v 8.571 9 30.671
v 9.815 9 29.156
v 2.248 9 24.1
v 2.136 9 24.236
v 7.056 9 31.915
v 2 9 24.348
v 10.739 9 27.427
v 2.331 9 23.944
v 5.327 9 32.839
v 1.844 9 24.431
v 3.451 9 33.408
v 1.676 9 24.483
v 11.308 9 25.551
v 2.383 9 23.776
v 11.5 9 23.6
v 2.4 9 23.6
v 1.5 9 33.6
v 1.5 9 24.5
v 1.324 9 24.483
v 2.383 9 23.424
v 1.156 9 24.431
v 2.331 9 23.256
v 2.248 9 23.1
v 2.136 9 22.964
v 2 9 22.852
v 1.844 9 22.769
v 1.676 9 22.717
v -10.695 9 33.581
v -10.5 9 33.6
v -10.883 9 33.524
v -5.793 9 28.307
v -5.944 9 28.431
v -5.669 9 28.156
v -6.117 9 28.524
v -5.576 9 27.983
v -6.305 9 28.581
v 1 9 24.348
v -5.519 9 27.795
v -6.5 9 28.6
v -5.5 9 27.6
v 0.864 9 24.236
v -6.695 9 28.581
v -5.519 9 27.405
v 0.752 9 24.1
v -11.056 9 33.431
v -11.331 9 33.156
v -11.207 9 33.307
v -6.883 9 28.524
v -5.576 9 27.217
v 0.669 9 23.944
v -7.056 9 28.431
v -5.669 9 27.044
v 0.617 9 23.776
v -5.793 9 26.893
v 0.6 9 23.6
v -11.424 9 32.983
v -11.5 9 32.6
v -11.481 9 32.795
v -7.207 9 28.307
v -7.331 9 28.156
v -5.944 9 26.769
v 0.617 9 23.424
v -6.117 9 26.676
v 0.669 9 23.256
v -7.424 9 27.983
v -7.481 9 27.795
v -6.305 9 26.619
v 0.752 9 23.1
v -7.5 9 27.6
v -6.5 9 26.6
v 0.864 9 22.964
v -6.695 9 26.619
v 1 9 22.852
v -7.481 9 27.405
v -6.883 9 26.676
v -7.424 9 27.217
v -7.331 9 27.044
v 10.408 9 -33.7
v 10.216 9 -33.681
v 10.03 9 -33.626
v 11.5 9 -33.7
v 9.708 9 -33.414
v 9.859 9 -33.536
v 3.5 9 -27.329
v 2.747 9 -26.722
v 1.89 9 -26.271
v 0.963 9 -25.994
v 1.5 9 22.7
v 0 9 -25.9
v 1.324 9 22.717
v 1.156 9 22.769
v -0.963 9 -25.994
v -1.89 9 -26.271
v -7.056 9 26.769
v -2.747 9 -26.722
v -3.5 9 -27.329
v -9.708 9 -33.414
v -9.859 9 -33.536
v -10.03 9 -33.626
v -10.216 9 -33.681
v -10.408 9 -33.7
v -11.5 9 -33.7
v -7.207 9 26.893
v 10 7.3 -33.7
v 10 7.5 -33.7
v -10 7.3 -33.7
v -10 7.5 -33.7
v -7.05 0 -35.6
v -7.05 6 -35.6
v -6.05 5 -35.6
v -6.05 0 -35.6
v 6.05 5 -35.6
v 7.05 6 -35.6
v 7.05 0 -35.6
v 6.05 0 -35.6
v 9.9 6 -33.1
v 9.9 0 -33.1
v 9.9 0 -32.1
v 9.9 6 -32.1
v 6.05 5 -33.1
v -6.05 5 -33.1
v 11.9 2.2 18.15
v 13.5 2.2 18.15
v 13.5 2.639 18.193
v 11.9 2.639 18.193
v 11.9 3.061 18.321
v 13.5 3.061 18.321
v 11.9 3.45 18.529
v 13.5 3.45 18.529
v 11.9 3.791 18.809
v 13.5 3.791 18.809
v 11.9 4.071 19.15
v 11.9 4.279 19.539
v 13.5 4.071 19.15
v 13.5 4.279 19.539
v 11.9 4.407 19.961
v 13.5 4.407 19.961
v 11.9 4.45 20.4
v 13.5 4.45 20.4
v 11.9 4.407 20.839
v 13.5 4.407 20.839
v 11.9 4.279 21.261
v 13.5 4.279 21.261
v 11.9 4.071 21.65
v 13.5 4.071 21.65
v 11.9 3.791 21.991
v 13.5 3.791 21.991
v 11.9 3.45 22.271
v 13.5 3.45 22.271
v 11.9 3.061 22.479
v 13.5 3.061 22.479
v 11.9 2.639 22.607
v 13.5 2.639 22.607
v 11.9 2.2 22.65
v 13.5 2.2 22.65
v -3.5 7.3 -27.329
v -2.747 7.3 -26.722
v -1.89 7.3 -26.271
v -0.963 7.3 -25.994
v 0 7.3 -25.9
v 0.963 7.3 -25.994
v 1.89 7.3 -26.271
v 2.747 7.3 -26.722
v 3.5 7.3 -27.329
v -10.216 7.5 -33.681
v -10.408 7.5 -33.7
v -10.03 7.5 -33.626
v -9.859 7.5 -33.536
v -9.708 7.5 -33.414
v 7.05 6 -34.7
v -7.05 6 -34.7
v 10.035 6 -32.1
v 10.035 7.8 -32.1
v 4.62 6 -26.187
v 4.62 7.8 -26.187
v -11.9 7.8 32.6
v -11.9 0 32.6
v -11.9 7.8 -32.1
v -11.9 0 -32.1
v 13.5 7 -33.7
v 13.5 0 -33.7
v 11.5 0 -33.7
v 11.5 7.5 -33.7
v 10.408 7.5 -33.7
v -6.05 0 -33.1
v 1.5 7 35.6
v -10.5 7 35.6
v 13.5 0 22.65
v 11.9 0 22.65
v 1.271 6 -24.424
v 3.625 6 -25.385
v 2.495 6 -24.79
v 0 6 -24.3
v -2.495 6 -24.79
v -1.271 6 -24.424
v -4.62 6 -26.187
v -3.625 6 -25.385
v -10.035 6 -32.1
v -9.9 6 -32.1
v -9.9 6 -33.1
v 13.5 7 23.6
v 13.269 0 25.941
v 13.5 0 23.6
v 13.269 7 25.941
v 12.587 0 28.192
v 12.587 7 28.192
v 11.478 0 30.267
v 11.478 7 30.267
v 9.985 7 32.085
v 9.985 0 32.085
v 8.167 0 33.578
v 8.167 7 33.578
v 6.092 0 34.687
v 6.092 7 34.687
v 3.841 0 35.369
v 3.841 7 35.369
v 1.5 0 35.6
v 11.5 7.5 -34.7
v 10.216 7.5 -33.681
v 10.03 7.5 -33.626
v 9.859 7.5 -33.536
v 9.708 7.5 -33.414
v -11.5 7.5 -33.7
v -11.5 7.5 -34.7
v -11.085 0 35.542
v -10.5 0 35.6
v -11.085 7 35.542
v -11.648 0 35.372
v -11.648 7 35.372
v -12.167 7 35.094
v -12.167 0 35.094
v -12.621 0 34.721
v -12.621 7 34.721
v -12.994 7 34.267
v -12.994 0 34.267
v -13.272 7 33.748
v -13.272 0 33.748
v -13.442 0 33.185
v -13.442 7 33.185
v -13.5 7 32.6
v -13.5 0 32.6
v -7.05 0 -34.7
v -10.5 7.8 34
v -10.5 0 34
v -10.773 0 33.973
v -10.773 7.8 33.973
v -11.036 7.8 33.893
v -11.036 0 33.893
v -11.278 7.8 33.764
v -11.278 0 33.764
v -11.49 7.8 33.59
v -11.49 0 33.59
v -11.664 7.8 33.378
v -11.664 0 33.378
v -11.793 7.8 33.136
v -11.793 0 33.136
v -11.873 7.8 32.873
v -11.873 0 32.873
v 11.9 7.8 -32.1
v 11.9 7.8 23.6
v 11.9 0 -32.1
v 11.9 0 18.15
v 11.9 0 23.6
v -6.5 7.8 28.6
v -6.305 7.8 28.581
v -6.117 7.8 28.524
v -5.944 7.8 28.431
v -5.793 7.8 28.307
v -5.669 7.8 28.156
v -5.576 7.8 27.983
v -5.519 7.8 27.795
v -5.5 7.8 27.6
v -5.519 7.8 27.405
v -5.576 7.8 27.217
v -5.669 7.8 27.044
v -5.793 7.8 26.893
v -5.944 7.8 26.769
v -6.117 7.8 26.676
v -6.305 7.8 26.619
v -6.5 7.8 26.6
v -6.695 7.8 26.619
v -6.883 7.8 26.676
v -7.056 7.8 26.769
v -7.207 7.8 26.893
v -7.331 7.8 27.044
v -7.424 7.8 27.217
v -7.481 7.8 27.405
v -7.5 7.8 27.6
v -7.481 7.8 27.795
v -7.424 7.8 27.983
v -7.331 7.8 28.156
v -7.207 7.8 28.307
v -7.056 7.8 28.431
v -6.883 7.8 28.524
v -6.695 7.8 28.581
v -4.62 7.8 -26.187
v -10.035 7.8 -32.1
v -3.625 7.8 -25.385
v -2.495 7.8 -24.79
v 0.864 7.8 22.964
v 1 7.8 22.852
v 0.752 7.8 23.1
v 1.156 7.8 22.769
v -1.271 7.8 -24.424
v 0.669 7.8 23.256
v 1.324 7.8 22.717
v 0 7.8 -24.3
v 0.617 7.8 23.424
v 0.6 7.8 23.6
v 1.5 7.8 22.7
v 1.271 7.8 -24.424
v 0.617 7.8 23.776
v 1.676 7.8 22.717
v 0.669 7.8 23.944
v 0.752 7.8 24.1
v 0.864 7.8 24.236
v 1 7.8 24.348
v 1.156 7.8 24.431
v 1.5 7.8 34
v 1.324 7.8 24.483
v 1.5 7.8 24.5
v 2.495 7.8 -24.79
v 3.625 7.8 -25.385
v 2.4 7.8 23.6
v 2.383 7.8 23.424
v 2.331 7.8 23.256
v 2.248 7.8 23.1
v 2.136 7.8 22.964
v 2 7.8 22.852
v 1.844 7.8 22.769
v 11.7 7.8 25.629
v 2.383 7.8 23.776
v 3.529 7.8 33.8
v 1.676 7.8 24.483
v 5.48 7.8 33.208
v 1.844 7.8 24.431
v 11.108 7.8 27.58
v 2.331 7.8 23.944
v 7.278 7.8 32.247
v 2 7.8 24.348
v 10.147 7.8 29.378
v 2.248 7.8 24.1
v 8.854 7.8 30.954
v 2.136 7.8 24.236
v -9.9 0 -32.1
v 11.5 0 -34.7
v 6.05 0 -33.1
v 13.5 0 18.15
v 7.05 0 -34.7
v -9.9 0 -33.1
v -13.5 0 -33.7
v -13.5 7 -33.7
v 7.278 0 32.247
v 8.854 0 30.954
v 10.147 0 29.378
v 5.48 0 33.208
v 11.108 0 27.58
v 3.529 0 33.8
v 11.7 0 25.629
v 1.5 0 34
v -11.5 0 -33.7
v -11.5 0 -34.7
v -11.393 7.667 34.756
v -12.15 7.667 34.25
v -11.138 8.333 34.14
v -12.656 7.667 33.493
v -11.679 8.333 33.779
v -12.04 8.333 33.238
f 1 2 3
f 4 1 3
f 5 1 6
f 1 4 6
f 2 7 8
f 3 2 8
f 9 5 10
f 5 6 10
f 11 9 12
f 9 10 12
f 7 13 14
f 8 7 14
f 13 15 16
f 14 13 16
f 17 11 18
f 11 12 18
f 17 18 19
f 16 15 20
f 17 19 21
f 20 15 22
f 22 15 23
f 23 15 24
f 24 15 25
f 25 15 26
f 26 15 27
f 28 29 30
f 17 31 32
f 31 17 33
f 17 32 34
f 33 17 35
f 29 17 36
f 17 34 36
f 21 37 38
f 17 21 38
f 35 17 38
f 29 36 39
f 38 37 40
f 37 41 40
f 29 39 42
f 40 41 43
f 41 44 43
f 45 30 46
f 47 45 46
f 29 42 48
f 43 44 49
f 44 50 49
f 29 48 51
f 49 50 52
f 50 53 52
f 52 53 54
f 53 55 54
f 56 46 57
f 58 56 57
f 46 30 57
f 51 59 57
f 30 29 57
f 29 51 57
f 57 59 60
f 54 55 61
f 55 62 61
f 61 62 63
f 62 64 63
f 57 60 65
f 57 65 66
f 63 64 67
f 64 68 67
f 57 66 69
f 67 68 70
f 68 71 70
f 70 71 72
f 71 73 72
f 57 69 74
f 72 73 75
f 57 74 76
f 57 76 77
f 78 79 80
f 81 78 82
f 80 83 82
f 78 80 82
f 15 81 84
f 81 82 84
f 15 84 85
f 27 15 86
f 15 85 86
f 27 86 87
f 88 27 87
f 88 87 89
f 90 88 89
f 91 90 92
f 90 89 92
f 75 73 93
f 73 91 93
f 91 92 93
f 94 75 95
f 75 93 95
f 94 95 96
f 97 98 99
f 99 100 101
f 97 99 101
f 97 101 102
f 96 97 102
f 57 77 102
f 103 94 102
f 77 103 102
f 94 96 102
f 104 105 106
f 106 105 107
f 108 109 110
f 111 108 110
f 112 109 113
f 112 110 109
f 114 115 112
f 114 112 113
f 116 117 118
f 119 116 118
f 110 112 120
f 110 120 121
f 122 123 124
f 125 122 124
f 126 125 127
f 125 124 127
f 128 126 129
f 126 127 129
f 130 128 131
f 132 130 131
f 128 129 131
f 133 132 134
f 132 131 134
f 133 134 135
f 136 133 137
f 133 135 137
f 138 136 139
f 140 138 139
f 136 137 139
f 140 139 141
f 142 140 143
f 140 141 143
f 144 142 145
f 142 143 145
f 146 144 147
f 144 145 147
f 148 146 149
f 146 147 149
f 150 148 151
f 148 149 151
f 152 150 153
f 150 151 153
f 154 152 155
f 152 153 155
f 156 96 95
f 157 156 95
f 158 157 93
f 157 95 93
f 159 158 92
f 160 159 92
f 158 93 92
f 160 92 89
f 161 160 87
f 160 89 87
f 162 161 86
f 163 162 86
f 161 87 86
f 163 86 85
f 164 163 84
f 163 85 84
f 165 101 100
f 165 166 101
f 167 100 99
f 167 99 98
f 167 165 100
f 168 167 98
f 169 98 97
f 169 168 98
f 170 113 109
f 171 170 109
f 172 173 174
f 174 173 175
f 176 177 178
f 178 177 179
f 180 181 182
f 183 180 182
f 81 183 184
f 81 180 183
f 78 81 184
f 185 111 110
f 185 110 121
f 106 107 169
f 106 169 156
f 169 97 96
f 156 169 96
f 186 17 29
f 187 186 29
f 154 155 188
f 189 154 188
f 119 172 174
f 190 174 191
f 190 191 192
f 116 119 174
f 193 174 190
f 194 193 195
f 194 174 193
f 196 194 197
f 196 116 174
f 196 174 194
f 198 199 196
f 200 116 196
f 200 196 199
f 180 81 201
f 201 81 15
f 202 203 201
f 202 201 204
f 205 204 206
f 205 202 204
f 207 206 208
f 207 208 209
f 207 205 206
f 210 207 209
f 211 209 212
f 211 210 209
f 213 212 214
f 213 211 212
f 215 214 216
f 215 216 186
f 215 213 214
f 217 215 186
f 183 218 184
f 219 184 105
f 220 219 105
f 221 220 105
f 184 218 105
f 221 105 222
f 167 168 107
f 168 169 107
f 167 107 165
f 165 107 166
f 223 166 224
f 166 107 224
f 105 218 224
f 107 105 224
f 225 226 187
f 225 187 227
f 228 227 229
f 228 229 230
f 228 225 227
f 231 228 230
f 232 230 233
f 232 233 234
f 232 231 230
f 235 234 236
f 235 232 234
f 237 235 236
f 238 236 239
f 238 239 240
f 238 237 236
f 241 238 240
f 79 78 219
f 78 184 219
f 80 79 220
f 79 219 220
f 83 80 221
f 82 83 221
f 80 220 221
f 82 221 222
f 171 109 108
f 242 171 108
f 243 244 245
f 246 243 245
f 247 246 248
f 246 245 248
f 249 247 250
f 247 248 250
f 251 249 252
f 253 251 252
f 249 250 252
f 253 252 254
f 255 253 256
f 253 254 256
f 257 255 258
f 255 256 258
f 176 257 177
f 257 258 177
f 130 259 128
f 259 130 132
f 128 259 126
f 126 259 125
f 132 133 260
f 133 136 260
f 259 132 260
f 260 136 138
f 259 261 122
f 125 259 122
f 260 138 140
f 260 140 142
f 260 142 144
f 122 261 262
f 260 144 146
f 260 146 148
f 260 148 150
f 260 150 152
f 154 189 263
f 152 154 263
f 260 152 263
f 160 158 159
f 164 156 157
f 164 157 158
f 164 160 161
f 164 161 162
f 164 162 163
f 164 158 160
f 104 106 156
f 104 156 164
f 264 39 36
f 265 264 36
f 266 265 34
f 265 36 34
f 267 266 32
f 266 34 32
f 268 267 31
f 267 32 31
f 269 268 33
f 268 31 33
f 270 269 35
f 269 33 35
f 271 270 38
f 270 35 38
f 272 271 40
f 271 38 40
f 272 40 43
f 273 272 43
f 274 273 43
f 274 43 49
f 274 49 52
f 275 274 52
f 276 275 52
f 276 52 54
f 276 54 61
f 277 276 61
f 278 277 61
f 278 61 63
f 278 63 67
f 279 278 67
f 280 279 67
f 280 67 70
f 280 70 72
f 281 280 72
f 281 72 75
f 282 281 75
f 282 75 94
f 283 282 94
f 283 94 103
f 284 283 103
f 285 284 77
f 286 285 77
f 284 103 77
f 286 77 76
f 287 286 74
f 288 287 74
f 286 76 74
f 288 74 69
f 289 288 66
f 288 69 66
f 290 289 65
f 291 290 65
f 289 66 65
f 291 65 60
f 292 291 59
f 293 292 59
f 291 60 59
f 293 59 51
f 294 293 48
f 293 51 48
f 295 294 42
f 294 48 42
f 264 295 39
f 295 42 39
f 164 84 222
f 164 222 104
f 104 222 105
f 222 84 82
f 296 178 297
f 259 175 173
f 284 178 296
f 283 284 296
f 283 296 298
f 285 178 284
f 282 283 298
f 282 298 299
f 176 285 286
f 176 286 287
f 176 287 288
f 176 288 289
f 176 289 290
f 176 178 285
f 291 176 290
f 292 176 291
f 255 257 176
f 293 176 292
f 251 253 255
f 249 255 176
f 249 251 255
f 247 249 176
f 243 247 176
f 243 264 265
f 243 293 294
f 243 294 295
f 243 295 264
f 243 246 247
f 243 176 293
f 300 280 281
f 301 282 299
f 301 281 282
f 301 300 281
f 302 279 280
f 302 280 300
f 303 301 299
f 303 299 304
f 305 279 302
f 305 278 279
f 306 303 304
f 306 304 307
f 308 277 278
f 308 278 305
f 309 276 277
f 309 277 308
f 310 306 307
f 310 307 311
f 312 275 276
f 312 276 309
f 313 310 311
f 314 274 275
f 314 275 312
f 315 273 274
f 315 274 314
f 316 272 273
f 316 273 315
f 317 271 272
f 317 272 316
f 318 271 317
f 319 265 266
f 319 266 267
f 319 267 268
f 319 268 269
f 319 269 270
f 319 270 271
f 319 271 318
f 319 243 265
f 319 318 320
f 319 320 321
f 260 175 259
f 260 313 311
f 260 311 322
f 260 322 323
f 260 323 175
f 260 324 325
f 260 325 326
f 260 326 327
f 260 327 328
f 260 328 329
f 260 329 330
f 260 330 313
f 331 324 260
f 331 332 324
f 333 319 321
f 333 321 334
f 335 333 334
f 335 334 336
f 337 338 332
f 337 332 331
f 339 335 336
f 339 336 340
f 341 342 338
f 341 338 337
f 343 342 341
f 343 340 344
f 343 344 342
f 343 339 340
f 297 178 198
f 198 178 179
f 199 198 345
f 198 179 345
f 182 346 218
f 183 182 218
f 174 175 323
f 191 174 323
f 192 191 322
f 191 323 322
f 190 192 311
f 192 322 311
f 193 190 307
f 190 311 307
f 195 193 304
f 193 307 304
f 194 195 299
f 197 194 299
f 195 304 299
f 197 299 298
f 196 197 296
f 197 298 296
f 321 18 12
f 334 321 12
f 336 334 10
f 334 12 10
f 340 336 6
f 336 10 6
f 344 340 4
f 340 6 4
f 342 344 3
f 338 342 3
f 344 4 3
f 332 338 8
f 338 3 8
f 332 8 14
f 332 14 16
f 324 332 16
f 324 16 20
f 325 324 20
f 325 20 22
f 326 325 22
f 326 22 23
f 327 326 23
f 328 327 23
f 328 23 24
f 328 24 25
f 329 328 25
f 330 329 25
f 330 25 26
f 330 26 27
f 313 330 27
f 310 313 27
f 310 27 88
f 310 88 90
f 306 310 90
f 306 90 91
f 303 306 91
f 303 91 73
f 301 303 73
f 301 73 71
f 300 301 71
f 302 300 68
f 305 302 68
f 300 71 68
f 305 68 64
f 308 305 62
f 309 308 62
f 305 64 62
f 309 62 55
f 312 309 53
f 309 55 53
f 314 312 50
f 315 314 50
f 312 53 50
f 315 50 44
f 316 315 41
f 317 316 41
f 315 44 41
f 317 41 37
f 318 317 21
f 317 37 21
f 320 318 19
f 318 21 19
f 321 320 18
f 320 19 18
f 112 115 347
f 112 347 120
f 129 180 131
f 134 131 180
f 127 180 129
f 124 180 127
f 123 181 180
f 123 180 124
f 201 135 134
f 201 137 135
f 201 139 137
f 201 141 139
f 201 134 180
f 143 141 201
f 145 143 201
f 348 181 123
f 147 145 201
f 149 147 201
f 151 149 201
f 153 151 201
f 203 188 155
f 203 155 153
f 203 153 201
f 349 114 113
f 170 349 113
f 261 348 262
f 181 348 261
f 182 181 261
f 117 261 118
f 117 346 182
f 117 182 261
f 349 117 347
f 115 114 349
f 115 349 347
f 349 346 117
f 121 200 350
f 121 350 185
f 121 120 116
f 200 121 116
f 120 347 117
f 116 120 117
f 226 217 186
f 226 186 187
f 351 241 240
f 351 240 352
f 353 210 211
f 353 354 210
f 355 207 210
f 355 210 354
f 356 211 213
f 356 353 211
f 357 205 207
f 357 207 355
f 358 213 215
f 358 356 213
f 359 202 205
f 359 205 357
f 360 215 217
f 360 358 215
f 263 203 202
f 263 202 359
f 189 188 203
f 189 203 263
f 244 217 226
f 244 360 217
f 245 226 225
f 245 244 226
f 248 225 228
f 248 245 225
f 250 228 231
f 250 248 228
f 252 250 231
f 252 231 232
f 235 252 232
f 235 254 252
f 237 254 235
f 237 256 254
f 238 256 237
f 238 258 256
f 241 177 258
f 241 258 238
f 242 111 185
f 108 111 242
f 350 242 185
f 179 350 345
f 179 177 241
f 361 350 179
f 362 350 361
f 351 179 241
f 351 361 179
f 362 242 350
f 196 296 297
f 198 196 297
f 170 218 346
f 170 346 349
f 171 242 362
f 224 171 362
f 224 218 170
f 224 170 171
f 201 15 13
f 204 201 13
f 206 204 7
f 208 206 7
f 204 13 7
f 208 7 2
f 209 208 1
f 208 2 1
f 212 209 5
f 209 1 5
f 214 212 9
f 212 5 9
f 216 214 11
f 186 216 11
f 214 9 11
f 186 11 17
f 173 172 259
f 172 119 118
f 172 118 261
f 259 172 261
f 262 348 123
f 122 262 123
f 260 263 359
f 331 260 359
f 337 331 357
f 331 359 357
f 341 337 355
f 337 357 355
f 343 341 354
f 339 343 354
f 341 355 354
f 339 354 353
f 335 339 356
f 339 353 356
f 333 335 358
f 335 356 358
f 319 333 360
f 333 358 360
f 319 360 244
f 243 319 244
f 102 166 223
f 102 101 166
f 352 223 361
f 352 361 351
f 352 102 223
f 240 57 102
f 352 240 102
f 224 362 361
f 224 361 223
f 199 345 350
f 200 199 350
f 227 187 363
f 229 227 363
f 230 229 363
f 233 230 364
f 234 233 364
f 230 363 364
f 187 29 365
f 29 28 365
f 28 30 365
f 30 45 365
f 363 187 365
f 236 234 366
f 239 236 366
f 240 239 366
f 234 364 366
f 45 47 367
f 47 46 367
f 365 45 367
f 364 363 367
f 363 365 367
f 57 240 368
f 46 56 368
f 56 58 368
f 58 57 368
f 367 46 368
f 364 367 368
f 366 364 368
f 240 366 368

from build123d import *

# Parameters (mm, degrees)
EXTRUDE_1_DEPTH     = 9
SKETCH_2_W          = 12.1
SKETCH_2_H          = 5
CUT_EXTRUDE_1_DEPTH = 0.9
SKETCH_3_R          = 29.401854515
SKETCH_3_W          = 23
SKETCH_3_H          = 15
CUT_EXTRUDE_2_DEPTH = 1
CHAMFER_1_SIZE      = 2
CUT_EXTRUDE_4_DEPTH = 7.8
SKETCH_5_W          = 12.1
SKETCH_5_H          = 1.6
CUT_EXTRUDE_5_DEPTH = 5
SKETCH_6_R          = 1
SKETCH_6_R_2        = 0.9
CUT_EXTRUDE_6_DEPTH = 3
CUT_EXTRUDE_7_DEPTH = 3
EXTRUDE_2_DEPTH     = 3
CUT_EXTRUDE_9_DEPTH = 1.7
FILLET_1_R          = 1


with BuildPart() as part:
    # Эскиз1 → Бобышка-Вытянуть1 (new body)
    with BuildSketch(Plane(origin=(0, 0, 0), x_dir=(1, 0, 0), z_dir=(0, 1, 0))):
        with BuildLine():
            Line((-13.5, 35.6), (13.5, 35.6))
            Line((13.5, 35.6), (13.5, -23.6))
            ThreePointArc((13.5, -23.6), (9.985281374, -32.085281374), (1.5, -35.6))
            Line((1.5, -35.6), (-10.5, -35.6))
            ThreePointArc((-10.5, -35.6), (-12.621320344, -34.721320344), (-13.5, -32.6))
            Line((-13.5, -32.6), (-13.5, 35.6))
        make_face()
    extrude(amount=EXTRUDE_1_DEPTH)

    # Эскиз2 → Вырез-Вытянуть1 (cut)
    with BuildSketch(Plane(origin=(0, 0, -35.6), x_dir=(-1, 0, 0), z_dir=(0, 0, -1))):
        Polygon((7.05, 6), (7.05, 0), (13.5, 0), (13.5, 9), (-13.5, 9), (-13.5, 0), (-7.05, 0), (-7.05, 6), align=None)
        with Locations((0, 2.5)):
            Rectangle(SKETCH_2_W, SKETCH_2_H)
    extrude(amount=-CUT_EXTRUDE_1_DEPTH, mode=Mode.SUBTRACT)

    # Эскиз3 → Вырез-Вытянуть2 (cut)
    with BuildSketch(Plane(origin=(0, 0, -34.7), x_dir=(-1, 0, 0), z_dir=(0, 0, -1))):
        Circle(SKETCH_3_R)
        Rectangle(SKETCH_3_W, SKETCH_3_H, mode=Mode.SUBTRACT)
    extrude(amount=-CUT_EXTRUDE_2_DEPTH, mode=Mode.SUBTRACT)

    # Фаска1
    chamfer_1_edges = [part.edges().sort_by_distance(p)[0] for p in [
        (-4.5, 9, 35.6),
        (9.985281374, 9, 32.085281374),
        (13.5, 9, -5.05),
        (-13.5, 9, -0.55),
        (-12.621320344, 9, 34.721320344),
    ]]
    chamfer(chamfer_1_edges, length=CHAMFER_1_SIZE)

    # Эскиз4 → Вырез-Вытянуть4 (cut)
    with BuildSketch(Plane.XZ):
        with BuildLine():
            Line((9.9, -33.1), (9.9, -32.1))
            Line((9.9, -32.1), (11.9, -32.1))
            Line((11.9, -32.1), (11.9, 23.6))
            ThreePointArc((11.9, 23.6), (8.853910524, 30.953910524), (1.5, 34))
            Line((1.5, 34), (-10.5, 34))
            ThreePointArc((-10.5, 34), (-11.489949494, 33.589949494), (-11.9, 32.6))
            Line((-11.9, 32.6), (-11.9, -32.1))
            Line((-11.9, -32.1), (-9.9, -32.1))
            Line((-9.9, -32.1), (-9.9, -33.1))
            Line((-9.9, -33.1), (9.9, -33.1))
        make_face()
    extrude(amount=-CUT_EXTRUDE_4_DEPTH, mode=Mode.SUBTRACT)

    # Эскиз5 → Вырез-Вытянуть5 (cut)
    with BuildSketch(Plane.XZ):
        with Locations((0, -33.9)):
            Rectangle(SKETCH_5_W, SKETCH_5_H)
    extrude(amount=-CUT_EXTRUDE_5_DEPTH, mode=Mode.SUBTRACT)

    # Эскиз6 → Вырез-Вытянуть6 (cut)
    with BuildSketch(Plane(origin=(0, 9, 0), x_dir=(1, 0, 0), z_dir=(0, 1, 0))):
        with Locations(Location((-6.5, -27.6, 0), (0, 0, 270))):
            Circle(SKETCH_6_R)
        with Locations(Location((1.5, -23.6, 0), (0, 0, 270))):
            Circle(SKETCH_6_R_2)
    extrude(amount=-CUT_EXTRUDE_6_DEPTH, mode=Mode.SUBTRACT)

    # Эскиз8 → Вырез-Вытянуть7 (cut)
    with BuildSketch(Plane(origin=(13.5, 0, 0), x_dir=(0, 0, -1), z_dir=(1, 0, 0))):
        with BuildLine():
            Line((-22.65, 2.2), (-22.65, 0))
            Line((-22.65, 0), (-18.15, 0))
            Line((-18.15, 0), (-18.15, 2.2))
            ThreePointArc((-18.15, 2.2), (-20.4, 4.45), (-22.65, 2.2))
        make_face()
    extrude(amount=-CUT_EXTRUDE_7_DEPTH, mode=Mode.SUBTRACT)

    # Эскиз10 → Бобышка-Вытянуть2 (add)
    with BuildSketch(Plane(origin=(0, 9, 0), x_dir=(1, 0, 0), z_dir=(0, 1, 0))):
        with BuildLine():
            Line((-11.5, 33.7), (11.5, 33.7))
            Line((11.5, 33.7), (4.619956712, 26.186537456))
            ThreePointArc((4.619956712, 26.186537456), (0, 24.3), (-4.619956712, 26.186537456))
            Line((-4.619956712, 26.186537456), (-11.5, 33.7))
        make_face()
    extrude(amount=-EXTRUDE_2_DEPTH)

    # Эскиз9 → Вырез-Вытянуть9 (cut)
    with BuildSketch(Plane(origin=(0, 9, 0), x_dir=(1, 0, 0), z_dir=(0, 1, 0))):
        with BuildLine():
            Line((-10, 33.7), (-3.5, 27.329208434))
            ThreePointArc((-3.5, 27.329208434), (0, 25.9), (3.5, 27.329208434))
            Line((3.5, 27.329208434), (10, 33.7))
            Line((10, 33.7), (-10, 33.7))
        make_face()
    extrude(amount=-CUT_EXTRUDE_9_DEPTH, mode=Mode.SUBTRACT)

    # Скругление1
    fillet_1_edges = [part.edges().sort_by_distance(p)[0] for p in [
        (-10, 8.25, -33.7),
        (10, 8.25, -33.7),
    ]]
    fillet(fillet_1_edges, radius=FILLET_1_R)


solid = part.part
